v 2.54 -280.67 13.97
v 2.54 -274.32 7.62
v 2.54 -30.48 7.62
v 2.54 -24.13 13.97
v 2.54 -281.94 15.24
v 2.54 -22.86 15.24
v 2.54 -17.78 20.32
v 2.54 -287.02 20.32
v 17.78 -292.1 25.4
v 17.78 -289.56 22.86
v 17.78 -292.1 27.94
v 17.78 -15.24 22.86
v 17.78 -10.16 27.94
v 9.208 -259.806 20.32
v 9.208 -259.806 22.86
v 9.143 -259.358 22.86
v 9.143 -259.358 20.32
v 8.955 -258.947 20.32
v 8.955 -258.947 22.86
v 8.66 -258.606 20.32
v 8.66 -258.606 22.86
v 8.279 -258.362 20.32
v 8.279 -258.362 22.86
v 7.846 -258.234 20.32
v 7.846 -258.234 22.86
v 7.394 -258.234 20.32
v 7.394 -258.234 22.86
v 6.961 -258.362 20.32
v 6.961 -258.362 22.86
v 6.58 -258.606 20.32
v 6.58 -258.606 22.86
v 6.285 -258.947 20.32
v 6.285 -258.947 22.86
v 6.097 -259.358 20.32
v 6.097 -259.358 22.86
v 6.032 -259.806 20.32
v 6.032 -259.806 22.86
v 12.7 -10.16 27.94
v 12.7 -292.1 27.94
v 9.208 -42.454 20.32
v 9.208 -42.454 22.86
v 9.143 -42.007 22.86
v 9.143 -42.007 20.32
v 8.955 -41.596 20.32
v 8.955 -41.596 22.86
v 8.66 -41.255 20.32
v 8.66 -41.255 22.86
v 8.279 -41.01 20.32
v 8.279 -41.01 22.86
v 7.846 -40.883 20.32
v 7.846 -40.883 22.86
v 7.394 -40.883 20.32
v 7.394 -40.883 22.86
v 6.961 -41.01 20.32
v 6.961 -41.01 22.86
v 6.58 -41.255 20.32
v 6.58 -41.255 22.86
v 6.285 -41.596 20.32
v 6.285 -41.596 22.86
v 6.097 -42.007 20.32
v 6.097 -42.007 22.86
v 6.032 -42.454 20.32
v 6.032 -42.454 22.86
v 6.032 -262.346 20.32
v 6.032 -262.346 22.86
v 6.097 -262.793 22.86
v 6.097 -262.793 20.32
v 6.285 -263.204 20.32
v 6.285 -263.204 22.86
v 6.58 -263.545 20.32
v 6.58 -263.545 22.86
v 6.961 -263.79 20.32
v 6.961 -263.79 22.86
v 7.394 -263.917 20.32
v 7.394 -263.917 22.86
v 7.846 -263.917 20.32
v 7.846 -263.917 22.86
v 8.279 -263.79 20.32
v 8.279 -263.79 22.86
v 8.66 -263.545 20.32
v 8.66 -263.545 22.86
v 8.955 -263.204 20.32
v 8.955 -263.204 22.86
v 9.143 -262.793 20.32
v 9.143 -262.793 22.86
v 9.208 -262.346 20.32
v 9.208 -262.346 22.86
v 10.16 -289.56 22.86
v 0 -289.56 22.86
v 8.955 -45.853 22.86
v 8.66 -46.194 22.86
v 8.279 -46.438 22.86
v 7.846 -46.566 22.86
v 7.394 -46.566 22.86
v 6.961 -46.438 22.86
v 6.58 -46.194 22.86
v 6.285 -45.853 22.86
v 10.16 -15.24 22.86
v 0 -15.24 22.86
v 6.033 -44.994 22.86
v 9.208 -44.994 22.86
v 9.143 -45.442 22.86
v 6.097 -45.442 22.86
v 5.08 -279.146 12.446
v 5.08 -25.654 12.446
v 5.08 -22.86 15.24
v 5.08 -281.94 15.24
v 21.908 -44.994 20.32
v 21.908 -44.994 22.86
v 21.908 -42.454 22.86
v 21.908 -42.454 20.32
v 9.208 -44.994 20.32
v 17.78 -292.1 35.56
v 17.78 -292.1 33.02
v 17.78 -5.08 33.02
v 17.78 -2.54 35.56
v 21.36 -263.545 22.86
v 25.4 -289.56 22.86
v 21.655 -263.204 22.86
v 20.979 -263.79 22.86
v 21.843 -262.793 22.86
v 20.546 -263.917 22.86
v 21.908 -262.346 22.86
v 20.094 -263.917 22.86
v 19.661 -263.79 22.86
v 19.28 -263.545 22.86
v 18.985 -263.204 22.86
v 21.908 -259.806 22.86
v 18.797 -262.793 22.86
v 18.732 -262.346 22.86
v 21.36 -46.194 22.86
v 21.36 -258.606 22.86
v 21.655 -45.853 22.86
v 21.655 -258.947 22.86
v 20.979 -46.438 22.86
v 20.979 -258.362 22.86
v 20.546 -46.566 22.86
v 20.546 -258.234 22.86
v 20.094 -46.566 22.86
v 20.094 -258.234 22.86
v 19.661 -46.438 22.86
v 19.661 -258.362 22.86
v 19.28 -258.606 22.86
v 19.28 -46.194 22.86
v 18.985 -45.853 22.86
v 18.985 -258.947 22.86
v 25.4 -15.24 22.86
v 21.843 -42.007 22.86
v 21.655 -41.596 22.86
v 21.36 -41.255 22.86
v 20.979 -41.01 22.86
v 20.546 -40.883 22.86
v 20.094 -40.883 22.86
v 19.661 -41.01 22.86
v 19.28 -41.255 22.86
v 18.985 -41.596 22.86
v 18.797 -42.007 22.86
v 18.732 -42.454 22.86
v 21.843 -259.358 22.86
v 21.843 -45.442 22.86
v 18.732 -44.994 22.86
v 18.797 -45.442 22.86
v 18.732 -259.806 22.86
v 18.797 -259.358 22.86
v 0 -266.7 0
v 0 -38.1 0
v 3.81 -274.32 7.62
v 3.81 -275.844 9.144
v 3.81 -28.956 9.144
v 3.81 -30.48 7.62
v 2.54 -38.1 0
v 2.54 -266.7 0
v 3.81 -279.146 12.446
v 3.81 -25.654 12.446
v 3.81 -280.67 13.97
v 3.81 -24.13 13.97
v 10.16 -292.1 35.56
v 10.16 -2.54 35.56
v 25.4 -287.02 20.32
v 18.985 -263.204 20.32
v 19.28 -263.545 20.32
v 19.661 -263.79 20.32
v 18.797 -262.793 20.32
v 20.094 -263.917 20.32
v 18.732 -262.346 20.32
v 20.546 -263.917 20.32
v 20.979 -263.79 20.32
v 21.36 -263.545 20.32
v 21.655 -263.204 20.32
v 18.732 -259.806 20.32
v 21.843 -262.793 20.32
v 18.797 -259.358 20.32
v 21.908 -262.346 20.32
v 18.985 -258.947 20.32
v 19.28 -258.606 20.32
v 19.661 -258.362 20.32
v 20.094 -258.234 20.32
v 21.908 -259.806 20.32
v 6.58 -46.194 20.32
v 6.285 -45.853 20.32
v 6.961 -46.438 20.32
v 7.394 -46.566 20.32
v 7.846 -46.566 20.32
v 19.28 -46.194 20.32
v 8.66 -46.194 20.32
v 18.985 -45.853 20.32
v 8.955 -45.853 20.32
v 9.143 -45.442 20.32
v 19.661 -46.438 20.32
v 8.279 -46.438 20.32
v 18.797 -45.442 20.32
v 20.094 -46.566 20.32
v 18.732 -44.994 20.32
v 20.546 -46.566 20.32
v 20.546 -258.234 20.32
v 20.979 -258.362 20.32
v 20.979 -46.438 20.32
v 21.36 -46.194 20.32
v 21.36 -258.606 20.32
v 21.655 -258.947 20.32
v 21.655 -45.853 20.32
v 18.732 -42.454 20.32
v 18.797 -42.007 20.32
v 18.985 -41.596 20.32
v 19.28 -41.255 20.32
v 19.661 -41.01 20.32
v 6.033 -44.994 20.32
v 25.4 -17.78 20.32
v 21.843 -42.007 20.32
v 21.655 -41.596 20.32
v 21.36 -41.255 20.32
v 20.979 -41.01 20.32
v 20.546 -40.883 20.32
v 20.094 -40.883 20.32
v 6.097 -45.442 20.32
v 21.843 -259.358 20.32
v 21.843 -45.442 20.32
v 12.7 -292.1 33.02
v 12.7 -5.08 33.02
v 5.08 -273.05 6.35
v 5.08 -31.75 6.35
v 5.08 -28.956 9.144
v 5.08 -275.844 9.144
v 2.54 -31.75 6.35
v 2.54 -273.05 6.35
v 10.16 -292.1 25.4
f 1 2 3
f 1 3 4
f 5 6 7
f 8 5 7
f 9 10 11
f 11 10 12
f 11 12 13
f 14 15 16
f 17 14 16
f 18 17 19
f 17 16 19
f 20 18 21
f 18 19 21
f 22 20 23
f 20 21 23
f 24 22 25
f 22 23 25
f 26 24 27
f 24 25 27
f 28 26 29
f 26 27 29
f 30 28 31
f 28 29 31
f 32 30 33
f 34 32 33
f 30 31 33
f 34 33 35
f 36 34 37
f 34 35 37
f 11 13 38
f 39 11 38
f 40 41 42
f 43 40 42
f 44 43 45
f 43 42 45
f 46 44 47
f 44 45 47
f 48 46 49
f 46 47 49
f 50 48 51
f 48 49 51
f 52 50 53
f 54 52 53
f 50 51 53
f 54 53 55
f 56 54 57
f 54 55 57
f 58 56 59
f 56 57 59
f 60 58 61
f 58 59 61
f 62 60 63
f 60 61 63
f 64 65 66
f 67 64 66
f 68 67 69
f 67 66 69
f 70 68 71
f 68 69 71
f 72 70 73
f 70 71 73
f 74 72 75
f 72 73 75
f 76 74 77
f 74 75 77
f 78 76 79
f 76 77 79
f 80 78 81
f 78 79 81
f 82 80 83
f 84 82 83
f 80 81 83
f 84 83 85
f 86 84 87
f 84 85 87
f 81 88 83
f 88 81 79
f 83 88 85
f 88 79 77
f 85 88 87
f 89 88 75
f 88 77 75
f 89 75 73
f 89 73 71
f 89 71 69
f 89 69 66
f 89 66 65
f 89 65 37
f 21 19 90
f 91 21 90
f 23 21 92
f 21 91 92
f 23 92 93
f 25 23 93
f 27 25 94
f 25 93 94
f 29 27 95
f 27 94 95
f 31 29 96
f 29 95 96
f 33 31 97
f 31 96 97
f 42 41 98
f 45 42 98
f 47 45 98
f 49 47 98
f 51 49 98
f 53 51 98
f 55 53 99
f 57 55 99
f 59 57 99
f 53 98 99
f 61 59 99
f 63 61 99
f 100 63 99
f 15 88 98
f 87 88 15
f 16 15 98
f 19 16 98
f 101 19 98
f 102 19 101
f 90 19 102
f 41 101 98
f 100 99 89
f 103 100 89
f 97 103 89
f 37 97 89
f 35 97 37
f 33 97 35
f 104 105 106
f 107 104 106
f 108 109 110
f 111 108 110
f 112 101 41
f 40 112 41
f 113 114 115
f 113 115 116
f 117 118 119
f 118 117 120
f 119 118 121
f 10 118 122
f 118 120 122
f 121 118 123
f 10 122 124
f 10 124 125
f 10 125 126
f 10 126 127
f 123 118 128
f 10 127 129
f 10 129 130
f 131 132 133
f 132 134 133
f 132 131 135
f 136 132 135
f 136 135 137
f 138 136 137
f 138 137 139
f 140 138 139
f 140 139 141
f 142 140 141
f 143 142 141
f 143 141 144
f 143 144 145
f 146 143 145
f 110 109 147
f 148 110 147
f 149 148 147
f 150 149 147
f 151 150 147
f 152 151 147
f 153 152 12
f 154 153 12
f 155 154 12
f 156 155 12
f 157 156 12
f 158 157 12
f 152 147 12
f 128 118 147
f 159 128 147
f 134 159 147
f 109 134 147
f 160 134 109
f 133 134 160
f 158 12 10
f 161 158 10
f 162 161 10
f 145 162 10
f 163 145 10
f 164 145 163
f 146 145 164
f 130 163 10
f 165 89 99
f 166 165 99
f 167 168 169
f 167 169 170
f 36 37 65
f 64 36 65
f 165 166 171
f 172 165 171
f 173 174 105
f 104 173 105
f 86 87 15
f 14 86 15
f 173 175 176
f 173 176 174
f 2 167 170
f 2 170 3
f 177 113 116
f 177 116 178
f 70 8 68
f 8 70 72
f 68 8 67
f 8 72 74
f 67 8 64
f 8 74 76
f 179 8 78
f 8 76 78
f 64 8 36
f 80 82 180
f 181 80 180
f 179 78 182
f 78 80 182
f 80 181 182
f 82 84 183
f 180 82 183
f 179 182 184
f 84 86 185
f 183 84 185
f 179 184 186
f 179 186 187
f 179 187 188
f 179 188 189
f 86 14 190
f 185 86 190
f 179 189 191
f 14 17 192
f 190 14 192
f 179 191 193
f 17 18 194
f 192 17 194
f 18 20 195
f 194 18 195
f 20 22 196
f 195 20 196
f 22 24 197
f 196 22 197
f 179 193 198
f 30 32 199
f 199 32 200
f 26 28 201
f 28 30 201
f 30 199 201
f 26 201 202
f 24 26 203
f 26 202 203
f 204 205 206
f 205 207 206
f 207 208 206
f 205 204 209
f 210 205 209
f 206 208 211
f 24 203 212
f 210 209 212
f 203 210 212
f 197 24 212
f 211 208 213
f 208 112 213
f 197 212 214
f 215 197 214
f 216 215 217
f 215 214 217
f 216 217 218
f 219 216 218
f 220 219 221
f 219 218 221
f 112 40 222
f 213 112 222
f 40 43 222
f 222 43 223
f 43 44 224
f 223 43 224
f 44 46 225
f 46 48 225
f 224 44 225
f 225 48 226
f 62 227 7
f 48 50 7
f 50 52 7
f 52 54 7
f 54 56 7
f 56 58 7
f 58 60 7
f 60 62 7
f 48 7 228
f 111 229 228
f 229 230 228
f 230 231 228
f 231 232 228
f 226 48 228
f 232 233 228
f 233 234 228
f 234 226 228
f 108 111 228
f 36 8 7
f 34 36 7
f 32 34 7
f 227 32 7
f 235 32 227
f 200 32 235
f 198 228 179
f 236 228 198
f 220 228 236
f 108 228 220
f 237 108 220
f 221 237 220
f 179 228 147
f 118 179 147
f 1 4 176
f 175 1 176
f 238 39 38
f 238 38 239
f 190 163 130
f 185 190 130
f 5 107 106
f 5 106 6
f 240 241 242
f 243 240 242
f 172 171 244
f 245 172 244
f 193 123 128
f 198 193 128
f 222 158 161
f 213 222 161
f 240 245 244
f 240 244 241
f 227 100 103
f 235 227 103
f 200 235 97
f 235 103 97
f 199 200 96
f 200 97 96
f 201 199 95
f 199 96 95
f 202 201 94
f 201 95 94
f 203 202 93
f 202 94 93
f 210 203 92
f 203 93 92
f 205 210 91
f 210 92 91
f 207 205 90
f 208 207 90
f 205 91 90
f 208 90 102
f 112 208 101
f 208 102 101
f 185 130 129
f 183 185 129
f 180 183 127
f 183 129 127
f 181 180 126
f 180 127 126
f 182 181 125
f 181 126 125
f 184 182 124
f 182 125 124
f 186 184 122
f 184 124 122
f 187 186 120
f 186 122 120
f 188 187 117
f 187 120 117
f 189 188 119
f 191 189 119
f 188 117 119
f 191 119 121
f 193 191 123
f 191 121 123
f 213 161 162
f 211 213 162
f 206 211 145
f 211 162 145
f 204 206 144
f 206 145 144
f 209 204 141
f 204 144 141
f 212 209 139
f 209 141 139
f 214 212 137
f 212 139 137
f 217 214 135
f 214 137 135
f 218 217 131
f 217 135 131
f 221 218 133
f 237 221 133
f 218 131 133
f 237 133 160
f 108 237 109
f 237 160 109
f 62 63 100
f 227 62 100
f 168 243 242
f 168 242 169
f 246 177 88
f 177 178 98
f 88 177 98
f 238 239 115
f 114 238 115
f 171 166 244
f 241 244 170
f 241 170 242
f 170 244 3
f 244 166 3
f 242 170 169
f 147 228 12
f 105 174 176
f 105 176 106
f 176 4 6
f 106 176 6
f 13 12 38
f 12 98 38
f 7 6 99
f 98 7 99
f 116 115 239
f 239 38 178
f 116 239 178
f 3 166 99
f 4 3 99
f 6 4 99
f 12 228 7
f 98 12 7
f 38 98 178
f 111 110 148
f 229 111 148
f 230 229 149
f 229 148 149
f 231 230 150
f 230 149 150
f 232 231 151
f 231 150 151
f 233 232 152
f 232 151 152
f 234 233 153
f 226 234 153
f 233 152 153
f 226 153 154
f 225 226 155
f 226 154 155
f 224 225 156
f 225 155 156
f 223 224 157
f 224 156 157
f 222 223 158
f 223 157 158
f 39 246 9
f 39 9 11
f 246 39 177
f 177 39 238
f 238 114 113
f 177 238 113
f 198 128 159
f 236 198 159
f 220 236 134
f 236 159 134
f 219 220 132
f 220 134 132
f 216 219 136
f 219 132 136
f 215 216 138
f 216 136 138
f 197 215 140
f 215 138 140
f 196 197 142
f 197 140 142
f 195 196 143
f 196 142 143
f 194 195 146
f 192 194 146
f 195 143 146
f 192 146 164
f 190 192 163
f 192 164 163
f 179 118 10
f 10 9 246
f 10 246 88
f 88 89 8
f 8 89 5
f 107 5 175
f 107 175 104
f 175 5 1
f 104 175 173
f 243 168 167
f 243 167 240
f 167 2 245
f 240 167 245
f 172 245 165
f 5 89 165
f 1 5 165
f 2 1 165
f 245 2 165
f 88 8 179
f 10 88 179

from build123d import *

# Parameters (mm, degrees)
F1_DEPTH = 304.8
F3_DEPTH = 25.4
F5_DEPTH = 50.8
F7_DEPTH = 25.4


with BuildPart() as f1:
    # F0 (on Front) → F1 (new body)
    with BuildSketch(Plane.XZ):
        Polygon((0, 22.86), (0, 0), (2.54, 0), (2.54, 6.35), (5.08, 6.35), (5.08, 9.144), (3.81, 9.144), (3.81, 7.62), (2.54, 7.62), (2.54, 13.97), (3.81, 13.97), (3.81, 12.446), (5.08, 12.446), (5.08, 15.24), (2.54, 15.24), (2.54, 20.32), (25.4, 20.32), (25.4, 22.86), (17.78, 22.86), (17.78, 27.94), (12.7, 27.94), (12.7, 33.02), (17.78, 33.02), (17.78, 35.56), (10.16, 35.56), (10.16, 22.86), align=None)
    extrude(amount=F1_DEPTH)

    # F2 (on face) → F3 (cut)
    with BuildSketch(Plane(origin=(0, 0, 0), x_dir=(0, -1, 0), z_dir=(-1, 0, 0))):
        Polygon((0, 38.1), (0, 0), (38.1, 0), align=None)
        Polygon((304.8, 0), (304.8, 38.1), (266.7, 0), align=None)
    extrude(amount=-F3_DEPTH, mode=Mode.SUBTRACT)

    # F4 (on face) → F5 (cut, symmetric)
    with BuildSketch(Plane.YZ.offset(2.54)):
        Polygon((-292.1, 25.4), (-292.1, 35.56), (-302.26, 35.56), align=None)
    extrude(amount=F5_DEPTH, both=True, mode=Mode.SUBTRACT)

    # F6 (on face) → F7 (cut)
    with BuildSketch(Plane.XY.offset(22.86)):
        with BuildLine():
            ThreePointArc((9.2075, -259.805714), (7.62, -258.218214), (6.0325, -259.805714))
            Line((6.0325, -259.805714), (6.0325, -262.345714))
            ThreePointArc((6.0325, -262.345714), (7.62, -263.933214), (9.2075, -262.345714))
            Line((9.2075, -262.345714), (9.2075, -259.805714))
        make_face()
        with BuildLine():
            Line((21.9075, -262.345714), (21.9075, -259.805714))
            ThreePointArc((21.9075, -259.805714), (20.32, -258.218214), (18.7325, -259.805714))
            Line((18.7325, -259.805714), (18.7325, -262.345714))
            ThreePointArc((18.7325, -262.345714), (20.32, -263.933214), (21.9075, -262.345714))
        make_face()
        with BuildLine():
            Line((9.2075, -44.994286), (9.2075, -42.454286))
            ThreePointArc((9.2075, -42.454286), (7.62, -40.866786), (6.0325, -42.454286))
            Line((6.0325, -42.454286), (6.0325, -44.994286))
            ThreePointArc((6.0325, -44.994286), (7.62, -46.581786), (9.2075, -44.994286))
        make_face()
        with BuildLine():
            ThreePointArc((21.9075, -42.454286), (20.32, -40.866786), (18.7325, -42.454286))
            Line((18.7325, -42.454286), (18.7325, -44.994286))
            ThreePointArc((18.7325, -44.994286), (20.32, -46.581786), (21.9075, -44.994286))
            Line((21.9075, -44.994286), (21.9075, -42.454286))
        make_face()
    extrude(amount=-F7_DEPTH, mode=Mode.SUBTRACT)


solid = f1.part
